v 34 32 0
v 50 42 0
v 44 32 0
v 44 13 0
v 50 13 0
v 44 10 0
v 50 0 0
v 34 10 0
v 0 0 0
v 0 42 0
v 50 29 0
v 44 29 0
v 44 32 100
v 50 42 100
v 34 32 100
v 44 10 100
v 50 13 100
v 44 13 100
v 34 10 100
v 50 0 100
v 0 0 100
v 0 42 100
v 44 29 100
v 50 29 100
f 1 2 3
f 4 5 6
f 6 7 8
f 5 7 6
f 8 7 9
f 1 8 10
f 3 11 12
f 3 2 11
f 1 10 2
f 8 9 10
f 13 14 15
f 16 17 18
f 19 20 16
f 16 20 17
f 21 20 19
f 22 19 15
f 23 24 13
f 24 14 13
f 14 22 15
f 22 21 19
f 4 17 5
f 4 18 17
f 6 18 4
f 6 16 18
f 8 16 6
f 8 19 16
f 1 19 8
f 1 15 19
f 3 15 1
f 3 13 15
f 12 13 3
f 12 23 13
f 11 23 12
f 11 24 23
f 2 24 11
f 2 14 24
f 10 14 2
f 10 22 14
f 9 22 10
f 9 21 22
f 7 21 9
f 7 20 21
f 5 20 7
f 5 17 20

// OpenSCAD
$fn = 32;

// ----------------------------------------------------------------------
// T-slot rail: 50 x 42 mm section, 100 mm long
// ----------------------------------------------------------------------

// --- parameters (mm) ---
profile_height = 100;     // extrusion height
profile_points = 12;      // points of the closed outline

profile = [[0, 0], [50, 0], [50, 13], [44, 13], [44, 10], [34, 10], [34, 32], [44, 32], [44, 29], [50, 29], [50, 42], [0, 42]];  // single closed polygon, 12 points, counter clockwise

// --- the one profile operation ---
linear_extrude(height = profile_height) polygon(points = profile);
